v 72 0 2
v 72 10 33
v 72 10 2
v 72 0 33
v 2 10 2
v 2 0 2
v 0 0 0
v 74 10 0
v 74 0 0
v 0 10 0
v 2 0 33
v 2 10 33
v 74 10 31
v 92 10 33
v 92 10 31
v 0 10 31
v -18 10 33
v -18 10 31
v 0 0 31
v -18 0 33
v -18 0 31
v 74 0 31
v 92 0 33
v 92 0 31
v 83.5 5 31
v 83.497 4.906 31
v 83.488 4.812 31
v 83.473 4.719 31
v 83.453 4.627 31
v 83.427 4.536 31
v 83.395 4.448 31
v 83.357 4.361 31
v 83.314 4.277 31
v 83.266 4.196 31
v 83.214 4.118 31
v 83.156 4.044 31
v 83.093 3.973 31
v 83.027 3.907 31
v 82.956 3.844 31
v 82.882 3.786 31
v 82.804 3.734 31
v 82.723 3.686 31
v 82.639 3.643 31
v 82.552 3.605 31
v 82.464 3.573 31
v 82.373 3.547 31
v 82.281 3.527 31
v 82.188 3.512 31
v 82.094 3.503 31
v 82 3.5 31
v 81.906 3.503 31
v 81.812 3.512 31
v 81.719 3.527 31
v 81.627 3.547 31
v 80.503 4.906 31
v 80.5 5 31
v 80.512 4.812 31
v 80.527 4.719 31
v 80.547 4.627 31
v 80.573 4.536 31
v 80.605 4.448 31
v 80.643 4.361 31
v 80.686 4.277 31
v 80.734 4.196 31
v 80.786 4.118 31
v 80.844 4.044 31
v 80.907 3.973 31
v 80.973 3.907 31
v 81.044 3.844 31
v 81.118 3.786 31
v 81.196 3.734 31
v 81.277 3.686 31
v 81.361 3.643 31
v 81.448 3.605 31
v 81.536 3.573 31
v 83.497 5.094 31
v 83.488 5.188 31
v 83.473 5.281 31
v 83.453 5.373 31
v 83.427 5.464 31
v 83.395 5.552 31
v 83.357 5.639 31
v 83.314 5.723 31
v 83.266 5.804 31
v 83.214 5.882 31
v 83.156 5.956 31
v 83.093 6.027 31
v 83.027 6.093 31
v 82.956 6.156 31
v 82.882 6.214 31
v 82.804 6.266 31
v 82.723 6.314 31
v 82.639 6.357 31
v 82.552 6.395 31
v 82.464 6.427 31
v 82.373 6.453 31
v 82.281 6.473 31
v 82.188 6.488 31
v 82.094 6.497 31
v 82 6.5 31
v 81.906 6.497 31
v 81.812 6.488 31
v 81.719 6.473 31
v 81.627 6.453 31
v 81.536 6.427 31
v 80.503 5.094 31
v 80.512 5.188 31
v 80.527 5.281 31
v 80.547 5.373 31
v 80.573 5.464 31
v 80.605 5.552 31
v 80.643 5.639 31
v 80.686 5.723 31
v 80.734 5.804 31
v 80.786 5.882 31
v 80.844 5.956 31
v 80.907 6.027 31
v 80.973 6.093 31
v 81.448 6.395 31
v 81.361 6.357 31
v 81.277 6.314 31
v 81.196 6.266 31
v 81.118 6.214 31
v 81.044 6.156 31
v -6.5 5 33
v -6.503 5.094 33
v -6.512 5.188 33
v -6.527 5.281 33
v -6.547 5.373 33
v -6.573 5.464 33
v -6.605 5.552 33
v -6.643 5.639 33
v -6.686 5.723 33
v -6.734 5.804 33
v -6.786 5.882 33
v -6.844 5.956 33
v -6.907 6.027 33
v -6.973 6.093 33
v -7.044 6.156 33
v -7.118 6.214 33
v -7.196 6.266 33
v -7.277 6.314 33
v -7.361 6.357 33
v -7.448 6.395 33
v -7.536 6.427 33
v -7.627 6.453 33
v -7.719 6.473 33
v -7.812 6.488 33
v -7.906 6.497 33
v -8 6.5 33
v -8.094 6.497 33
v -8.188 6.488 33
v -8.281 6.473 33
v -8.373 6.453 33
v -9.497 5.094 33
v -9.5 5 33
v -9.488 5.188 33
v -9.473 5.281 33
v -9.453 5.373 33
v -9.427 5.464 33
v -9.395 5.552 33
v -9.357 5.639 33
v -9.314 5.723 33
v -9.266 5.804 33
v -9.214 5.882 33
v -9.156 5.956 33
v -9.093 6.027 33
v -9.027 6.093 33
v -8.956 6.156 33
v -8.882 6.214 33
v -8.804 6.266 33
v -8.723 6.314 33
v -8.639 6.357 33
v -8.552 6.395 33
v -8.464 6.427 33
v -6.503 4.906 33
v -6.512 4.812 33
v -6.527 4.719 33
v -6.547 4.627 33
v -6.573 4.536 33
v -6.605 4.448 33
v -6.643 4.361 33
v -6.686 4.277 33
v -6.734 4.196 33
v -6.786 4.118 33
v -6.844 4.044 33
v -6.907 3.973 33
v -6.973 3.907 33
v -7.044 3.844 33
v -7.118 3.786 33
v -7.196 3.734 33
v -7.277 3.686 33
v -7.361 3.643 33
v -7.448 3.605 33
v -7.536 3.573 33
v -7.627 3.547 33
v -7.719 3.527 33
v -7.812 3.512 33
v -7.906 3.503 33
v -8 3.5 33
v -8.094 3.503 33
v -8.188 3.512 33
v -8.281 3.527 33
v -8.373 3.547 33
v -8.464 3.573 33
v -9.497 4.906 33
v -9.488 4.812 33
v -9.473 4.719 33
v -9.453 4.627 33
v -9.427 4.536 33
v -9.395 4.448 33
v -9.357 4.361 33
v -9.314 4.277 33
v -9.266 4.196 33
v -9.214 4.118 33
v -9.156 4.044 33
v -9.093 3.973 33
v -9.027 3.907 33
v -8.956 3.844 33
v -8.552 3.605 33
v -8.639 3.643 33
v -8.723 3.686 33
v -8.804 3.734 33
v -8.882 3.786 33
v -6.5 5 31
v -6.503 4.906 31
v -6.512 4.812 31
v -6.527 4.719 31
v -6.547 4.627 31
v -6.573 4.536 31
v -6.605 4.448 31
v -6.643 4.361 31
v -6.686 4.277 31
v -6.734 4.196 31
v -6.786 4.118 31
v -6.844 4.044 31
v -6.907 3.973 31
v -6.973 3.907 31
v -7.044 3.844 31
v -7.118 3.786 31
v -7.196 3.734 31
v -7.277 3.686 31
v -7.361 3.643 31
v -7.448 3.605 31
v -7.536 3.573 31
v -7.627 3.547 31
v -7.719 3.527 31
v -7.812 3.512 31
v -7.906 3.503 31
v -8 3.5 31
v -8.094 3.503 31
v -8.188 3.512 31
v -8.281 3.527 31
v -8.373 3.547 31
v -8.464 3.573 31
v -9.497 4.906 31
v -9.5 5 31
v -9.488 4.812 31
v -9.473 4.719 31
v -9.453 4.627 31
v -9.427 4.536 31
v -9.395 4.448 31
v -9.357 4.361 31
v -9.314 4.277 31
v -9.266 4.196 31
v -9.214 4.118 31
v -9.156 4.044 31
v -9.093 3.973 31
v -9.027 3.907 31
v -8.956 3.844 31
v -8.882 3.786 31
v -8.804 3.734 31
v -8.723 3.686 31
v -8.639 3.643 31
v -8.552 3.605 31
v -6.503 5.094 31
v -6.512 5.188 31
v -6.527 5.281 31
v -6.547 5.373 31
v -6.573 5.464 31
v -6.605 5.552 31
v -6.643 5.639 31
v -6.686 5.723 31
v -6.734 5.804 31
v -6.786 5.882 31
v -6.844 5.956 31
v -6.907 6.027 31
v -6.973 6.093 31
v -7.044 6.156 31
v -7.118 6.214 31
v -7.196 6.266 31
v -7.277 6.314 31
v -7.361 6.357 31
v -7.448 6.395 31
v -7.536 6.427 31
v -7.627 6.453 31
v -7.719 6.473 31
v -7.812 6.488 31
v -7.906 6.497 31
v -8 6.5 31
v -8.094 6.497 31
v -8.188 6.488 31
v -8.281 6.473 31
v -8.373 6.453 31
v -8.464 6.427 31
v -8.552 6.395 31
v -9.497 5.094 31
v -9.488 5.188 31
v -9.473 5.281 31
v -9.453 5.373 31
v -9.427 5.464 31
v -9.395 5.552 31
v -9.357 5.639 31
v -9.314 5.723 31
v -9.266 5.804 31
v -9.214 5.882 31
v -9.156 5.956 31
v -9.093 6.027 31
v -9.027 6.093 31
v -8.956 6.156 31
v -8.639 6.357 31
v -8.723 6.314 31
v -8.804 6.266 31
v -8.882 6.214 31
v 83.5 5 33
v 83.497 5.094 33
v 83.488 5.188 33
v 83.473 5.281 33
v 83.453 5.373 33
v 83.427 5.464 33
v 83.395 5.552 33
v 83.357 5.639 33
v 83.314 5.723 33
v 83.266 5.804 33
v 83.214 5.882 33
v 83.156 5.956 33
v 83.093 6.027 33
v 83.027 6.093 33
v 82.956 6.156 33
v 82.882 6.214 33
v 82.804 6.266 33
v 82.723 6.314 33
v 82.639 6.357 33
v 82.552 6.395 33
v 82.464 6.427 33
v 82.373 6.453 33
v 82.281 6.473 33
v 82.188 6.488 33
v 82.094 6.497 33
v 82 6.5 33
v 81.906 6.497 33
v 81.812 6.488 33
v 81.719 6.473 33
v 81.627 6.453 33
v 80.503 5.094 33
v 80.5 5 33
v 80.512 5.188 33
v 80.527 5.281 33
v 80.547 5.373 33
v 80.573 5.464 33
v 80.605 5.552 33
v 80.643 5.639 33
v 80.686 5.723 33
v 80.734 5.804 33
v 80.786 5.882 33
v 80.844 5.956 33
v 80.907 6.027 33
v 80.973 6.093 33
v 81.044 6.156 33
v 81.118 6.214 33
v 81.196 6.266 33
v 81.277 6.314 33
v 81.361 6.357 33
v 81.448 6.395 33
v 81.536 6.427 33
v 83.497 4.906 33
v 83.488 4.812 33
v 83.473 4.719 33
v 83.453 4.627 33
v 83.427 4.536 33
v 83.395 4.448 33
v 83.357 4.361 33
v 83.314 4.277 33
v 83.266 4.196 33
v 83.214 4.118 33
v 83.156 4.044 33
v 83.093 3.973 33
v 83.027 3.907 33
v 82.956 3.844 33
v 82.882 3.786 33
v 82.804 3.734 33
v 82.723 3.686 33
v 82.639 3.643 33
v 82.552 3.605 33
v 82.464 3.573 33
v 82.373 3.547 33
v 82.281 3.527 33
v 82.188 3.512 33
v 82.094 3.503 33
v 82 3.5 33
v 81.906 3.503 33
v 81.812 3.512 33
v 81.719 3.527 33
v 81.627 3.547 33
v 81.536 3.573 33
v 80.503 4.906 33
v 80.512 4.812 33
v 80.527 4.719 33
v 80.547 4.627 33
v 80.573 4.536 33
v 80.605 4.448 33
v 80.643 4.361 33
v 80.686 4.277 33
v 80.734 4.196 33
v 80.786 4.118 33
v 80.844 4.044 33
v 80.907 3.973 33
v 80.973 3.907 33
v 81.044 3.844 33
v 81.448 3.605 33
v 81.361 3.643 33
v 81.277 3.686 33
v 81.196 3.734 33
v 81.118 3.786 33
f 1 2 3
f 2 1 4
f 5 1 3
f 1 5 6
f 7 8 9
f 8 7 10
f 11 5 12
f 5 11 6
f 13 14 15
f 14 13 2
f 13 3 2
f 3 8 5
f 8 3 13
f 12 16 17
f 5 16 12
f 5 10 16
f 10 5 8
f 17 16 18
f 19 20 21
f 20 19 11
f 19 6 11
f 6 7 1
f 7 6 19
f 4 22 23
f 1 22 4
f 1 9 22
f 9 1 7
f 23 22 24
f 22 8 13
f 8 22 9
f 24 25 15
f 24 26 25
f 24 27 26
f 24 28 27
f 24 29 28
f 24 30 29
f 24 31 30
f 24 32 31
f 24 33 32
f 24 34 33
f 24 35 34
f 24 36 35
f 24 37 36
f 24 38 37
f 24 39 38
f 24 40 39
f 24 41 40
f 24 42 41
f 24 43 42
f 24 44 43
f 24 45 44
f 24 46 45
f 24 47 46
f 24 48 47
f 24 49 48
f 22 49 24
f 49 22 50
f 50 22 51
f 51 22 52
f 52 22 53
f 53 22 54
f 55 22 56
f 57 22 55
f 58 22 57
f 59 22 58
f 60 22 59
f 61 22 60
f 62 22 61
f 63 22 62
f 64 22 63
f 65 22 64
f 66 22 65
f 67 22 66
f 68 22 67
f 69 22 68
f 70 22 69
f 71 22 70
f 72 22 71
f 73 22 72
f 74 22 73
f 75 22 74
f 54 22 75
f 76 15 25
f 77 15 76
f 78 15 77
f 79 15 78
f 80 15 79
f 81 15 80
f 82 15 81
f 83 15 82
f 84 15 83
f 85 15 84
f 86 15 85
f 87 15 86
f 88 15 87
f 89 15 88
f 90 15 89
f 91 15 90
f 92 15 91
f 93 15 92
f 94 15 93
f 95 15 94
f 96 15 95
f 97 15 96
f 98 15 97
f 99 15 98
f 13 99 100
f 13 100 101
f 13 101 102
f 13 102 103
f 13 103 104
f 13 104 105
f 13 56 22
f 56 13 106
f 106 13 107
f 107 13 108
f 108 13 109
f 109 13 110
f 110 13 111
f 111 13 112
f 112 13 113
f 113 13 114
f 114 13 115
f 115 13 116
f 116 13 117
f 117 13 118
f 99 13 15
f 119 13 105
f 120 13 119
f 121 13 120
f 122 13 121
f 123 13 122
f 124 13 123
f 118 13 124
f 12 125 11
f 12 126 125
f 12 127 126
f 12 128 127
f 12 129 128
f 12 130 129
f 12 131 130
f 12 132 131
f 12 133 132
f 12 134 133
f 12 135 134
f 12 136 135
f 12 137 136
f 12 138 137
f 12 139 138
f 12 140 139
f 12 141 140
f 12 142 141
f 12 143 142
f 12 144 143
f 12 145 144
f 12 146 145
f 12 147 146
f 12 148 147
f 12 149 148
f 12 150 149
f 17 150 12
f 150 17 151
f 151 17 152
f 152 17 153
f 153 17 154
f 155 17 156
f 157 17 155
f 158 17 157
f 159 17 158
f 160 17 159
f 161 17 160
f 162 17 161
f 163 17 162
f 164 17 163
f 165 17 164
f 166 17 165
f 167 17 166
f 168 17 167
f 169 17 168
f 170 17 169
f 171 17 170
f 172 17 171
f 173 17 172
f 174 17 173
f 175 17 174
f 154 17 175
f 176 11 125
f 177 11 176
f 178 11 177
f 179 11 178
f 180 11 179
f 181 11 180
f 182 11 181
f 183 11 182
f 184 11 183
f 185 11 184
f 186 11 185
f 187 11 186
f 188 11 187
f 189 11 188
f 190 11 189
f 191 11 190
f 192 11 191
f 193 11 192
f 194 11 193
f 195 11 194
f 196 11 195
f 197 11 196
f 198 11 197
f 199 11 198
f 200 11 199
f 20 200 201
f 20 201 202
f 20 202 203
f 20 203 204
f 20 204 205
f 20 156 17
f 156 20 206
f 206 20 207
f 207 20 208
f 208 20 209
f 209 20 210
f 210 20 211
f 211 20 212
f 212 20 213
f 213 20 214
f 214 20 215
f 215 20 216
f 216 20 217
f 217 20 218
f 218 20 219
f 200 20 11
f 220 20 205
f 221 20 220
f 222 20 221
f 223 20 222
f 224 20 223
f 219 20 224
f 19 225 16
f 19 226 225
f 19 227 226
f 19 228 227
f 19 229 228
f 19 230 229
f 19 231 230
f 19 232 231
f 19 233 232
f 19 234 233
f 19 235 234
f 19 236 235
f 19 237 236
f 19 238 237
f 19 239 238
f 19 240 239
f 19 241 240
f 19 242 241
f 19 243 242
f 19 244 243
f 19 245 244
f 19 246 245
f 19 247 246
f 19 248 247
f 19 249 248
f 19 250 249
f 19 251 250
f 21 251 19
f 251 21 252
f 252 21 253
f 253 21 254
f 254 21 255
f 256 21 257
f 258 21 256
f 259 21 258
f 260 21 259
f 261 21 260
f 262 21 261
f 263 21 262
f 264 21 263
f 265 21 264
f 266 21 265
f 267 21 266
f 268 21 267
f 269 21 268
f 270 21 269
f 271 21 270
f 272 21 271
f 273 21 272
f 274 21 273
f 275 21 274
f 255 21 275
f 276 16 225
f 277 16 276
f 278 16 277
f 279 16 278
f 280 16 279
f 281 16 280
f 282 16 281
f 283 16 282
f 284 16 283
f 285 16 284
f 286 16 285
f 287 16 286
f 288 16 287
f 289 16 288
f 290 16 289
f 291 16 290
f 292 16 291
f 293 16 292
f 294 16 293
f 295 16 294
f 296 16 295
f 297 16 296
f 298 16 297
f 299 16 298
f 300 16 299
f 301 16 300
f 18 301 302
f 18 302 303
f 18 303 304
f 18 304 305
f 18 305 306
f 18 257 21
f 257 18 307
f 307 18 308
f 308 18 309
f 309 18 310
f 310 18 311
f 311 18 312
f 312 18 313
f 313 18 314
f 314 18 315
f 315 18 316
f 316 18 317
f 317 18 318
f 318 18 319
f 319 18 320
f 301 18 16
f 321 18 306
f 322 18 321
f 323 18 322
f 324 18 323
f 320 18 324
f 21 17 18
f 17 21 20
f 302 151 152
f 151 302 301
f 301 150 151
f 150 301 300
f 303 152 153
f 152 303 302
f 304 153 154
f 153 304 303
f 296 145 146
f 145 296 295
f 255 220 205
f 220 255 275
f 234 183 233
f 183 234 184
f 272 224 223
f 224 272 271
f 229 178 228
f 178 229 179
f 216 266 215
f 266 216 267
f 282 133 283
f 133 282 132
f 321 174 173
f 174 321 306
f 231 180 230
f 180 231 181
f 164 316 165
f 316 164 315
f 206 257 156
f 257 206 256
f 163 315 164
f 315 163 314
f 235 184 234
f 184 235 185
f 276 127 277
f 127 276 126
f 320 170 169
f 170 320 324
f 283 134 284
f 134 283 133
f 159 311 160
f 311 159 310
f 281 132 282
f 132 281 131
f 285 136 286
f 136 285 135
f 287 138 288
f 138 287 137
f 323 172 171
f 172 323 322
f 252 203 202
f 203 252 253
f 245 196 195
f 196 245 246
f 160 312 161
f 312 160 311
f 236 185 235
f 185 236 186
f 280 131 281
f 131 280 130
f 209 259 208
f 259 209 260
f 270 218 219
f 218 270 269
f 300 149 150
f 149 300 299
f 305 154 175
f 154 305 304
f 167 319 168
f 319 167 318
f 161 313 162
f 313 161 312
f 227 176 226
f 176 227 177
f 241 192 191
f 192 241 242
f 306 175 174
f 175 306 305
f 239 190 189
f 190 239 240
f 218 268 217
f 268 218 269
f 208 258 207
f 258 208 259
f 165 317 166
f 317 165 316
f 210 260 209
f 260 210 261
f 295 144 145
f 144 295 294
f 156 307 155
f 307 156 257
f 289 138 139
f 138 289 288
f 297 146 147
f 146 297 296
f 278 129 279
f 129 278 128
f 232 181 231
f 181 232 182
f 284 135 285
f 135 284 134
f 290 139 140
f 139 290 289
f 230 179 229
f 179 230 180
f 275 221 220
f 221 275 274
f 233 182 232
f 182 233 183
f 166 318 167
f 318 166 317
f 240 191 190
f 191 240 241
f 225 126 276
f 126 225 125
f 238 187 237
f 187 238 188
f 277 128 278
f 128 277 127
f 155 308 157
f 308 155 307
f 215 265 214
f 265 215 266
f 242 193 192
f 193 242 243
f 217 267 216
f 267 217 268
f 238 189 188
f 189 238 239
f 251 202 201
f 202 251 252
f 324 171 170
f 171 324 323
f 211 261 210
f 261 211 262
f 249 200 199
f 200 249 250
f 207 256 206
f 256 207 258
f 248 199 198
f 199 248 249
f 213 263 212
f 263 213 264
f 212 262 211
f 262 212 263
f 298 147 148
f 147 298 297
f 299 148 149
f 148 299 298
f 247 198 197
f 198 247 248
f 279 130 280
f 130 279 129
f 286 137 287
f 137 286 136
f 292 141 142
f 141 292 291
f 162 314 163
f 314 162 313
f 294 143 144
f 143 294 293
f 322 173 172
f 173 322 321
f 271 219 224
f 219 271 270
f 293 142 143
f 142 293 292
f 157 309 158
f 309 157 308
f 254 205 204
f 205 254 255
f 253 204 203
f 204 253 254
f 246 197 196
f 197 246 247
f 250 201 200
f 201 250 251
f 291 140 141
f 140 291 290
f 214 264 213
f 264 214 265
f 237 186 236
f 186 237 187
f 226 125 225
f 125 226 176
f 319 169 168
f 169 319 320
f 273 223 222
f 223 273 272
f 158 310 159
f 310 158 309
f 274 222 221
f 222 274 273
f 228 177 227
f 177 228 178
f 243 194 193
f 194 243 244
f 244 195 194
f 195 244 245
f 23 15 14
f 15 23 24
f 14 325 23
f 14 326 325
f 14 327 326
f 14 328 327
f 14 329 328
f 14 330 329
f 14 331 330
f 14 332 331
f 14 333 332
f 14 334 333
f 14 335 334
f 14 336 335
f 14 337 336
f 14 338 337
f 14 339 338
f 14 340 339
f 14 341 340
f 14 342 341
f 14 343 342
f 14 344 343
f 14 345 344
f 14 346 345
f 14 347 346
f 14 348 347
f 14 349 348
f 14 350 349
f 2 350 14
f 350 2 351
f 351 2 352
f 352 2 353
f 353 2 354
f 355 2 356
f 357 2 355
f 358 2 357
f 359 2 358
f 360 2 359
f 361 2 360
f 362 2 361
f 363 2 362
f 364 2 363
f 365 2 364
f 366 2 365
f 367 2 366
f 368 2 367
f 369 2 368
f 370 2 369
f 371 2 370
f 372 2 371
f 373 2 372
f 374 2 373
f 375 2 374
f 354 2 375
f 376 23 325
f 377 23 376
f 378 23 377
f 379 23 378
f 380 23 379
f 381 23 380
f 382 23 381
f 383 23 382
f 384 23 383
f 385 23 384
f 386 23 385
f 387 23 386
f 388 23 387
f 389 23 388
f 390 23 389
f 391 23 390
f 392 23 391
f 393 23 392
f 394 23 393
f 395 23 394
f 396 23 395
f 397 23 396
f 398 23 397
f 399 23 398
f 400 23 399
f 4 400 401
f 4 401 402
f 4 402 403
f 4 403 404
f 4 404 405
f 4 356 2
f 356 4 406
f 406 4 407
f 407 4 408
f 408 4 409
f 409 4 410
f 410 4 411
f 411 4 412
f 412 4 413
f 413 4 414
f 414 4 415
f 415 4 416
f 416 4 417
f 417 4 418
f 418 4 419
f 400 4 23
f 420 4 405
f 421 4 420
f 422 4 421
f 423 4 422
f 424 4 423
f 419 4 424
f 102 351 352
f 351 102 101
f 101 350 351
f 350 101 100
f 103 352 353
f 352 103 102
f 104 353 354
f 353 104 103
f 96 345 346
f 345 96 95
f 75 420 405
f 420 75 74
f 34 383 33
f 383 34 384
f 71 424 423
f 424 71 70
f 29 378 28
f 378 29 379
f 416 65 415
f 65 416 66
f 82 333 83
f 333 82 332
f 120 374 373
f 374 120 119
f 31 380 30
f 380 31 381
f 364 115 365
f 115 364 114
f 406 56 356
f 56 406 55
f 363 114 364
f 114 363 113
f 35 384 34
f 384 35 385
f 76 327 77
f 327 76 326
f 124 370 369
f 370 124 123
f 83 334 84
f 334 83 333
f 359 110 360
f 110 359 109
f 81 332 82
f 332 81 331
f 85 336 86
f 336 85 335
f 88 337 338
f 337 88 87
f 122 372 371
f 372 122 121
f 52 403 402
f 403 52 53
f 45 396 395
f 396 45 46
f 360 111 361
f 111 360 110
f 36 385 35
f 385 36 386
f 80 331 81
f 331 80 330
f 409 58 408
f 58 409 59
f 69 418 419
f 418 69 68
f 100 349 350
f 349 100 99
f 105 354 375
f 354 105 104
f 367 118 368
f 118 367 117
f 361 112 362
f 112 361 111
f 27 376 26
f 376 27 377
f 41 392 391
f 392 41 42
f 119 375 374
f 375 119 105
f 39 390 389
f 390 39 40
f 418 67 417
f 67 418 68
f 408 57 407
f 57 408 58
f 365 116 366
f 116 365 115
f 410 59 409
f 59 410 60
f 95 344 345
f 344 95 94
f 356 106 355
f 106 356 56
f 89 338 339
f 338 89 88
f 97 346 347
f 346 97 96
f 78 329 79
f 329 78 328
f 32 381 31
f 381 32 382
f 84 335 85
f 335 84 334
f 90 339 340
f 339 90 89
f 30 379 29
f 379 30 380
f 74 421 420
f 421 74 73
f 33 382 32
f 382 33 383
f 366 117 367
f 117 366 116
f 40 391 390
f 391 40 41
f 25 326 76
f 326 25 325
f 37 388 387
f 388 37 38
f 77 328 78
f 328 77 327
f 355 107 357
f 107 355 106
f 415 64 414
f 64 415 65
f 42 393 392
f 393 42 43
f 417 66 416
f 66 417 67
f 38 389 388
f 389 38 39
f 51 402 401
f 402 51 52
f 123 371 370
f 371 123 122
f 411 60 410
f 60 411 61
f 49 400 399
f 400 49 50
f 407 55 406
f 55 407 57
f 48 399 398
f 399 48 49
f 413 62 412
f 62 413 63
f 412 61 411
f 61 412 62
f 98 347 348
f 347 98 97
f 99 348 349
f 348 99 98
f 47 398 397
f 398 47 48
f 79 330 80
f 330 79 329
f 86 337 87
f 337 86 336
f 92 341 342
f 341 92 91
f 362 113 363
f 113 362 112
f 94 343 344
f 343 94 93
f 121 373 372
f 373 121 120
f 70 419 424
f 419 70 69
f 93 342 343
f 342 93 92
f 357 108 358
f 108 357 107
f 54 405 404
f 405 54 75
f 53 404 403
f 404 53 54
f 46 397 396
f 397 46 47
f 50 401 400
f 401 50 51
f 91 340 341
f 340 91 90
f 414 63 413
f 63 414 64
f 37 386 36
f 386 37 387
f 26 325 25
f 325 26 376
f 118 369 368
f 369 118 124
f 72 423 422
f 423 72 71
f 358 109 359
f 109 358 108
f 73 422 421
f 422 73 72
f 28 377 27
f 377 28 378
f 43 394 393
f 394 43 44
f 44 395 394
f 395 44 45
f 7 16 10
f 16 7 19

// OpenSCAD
/*
 * Raspberry Pi 4 Wall mount
 * (c) 2020 David Mikulik
 * Licensed under 
 * Creative Commons 
 * Attribution Non Comercial Share alike license
 */
 

THIKNES=2;
LENGHT=70;
WALL_PART=20;
WIDTH=10;
HEIGHT=31;
SCREW_HOLE=3;

cube ([THIKNES,WIDTH,HEIGHT]);
translate([THIKNES,0,0]){
    cube ([LENGHT,WIDTH,THIKNES]);
    translate([LENGHT,0,0]){
        cube ([THIKNES,WIDTH,HEIGHT]);
    }
}
translate([-WALL_PART+THIKNES,0,HEIGHT]){
difference()
{
    cube ([WALL_PART,WIDTH,THIKNES]);
    rotate ([0,0,90]) {
        translate ([WIDTH/2,-WALL_PART/2,0]) {
            cylinder(d=SCREW_HOLE, h=THIKNES*2, $fn=100);    
        }
    }
}
}
translate([LENGHT+THIKNES,0,HEIGHT]){
difference()
{
    cube ([WALL_PART,WIDTH,THIKNES]);
    rotate ([0,0,90]) {
        translate ([WIDTH/2,-WALL_PART/2,0]) {
            cylinder(d=SCREW_HOLE, h=THIKNES*2, $fn=100);    
        }
    }
}
}
